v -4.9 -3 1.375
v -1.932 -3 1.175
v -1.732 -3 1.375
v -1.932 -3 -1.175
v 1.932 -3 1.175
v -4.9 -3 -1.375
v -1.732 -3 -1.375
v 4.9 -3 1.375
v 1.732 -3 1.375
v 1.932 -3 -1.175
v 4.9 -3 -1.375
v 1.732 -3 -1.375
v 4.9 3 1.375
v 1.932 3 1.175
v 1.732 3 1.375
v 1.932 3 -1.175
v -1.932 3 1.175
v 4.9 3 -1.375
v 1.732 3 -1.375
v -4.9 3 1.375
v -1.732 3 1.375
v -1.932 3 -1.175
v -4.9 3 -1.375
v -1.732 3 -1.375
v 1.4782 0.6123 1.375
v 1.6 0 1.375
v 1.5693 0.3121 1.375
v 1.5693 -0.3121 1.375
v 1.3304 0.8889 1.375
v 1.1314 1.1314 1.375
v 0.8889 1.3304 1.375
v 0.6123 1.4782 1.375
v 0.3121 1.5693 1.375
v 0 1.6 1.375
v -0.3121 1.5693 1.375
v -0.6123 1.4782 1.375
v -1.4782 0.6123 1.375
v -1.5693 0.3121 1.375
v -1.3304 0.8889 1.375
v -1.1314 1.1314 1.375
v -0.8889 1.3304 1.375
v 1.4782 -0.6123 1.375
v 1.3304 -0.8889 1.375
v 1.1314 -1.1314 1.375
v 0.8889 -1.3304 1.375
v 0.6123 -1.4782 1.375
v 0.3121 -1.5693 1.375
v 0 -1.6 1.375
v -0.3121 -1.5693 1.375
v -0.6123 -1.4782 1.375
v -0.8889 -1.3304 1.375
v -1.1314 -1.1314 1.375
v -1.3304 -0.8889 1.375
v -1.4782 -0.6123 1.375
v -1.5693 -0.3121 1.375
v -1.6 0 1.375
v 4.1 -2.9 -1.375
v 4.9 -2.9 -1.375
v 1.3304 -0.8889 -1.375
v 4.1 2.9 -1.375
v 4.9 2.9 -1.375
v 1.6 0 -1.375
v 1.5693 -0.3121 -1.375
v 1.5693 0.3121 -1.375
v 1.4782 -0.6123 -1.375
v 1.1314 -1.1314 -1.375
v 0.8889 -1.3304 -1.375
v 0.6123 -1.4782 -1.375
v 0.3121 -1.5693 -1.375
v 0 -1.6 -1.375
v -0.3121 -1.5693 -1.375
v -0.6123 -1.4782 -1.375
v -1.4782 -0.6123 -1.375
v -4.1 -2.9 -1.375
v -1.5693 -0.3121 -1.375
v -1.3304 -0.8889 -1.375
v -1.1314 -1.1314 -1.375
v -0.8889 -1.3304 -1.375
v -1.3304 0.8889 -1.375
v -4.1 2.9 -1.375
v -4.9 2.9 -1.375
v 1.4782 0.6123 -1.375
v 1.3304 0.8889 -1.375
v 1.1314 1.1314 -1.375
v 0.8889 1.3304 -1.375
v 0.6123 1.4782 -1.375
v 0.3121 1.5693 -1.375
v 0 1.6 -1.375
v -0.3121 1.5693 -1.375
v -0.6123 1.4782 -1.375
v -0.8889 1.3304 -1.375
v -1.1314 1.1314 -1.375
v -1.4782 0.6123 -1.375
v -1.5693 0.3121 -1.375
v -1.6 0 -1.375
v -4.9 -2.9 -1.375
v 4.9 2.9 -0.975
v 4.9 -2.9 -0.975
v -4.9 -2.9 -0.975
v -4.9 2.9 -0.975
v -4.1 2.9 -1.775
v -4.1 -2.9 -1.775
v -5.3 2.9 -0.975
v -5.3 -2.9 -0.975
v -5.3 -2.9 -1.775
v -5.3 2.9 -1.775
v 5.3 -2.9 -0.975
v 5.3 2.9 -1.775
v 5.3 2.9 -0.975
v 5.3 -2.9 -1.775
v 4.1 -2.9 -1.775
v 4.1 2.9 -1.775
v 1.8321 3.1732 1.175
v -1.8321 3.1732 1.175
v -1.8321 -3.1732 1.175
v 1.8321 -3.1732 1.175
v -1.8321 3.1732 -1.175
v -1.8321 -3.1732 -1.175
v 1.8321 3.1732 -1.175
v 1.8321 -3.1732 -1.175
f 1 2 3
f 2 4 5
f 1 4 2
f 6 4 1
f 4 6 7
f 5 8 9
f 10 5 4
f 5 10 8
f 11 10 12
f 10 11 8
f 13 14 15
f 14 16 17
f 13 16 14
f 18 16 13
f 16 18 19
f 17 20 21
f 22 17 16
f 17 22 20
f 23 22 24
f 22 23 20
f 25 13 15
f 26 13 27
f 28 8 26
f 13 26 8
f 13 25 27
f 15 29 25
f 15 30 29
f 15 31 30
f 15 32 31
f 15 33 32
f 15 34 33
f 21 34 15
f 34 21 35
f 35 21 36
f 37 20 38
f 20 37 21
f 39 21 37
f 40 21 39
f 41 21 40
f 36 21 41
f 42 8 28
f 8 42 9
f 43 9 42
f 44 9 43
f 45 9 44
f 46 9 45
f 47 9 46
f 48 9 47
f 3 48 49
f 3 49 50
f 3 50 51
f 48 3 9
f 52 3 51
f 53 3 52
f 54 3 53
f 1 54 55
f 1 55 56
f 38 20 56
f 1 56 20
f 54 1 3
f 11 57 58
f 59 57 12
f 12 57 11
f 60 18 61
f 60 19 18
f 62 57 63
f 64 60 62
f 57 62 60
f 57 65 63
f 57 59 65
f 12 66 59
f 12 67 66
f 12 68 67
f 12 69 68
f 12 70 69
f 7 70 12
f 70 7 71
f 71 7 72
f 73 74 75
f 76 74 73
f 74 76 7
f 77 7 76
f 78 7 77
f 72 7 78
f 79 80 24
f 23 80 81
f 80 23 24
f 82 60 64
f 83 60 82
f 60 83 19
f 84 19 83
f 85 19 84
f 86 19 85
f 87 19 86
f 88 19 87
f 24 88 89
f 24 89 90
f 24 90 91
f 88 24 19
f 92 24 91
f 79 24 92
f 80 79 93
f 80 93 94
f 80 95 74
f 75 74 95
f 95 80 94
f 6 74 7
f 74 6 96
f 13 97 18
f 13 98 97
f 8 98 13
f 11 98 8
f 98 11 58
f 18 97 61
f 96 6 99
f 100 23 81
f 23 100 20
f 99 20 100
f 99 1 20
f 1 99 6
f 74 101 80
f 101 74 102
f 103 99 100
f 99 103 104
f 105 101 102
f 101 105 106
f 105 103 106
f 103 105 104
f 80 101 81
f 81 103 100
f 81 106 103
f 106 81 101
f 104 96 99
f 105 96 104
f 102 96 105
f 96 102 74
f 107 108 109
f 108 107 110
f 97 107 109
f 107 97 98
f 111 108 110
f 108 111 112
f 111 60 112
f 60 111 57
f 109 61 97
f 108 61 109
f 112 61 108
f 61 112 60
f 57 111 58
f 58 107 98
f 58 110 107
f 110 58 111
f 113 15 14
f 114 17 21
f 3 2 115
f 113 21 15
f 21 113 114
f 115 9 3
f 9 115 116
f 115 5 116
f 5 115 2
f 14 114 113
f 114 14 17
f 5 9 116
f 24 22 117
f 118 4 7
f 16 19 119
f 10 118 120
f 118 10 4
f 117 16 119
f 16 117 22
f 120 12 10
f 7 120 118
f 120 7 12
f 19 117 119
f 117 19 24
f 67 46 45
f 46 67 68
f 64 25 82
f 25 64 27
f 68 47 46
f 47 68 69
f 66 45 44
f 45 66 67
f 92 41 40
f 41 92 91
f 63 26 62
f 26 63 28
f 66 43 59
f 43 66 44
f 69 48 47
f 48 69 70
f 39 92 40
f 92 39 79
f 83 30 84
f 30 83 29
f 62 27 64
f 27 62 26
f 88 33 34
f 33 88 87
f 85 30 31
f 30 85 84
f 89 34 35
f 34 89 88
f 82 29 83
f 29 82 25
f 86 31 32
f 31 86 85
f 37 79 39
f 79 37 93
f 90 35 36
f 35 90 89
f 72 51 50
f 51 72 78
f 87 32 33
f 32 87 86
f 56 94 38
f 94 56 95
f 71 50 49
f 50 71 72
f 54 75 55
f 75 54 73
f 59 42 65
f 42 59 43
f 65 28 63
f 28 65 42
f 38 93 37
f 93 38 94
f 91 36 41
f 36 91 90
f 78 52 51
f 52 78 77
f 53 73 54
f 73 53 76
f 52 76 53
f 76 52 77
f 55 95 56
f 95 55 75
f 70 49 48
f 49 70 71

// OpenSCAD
// Parameters
screw_diameter = 3; //[1.5:6:0.1]
across_flats = 6; //[3:12:0.1]
thickness = 2.75; //[1.4:5.5:0.05]
hole_style_is_clearance = 1; //[0:1:1]
clearance_diameter_if_clearance = 3.2; //[2.8:4.5:0.05]
tap_drill_diameter_if_tapped = 2.5; //[2:3:0.05]
corner_chamfer = 0.2; //[0:1:0.05]
t_slot_major_width = 10; //[6:20:0.1]
t_slot_minor_width = 6; //[4:12:0.1]
t_slot_lip_height = 0.8; //[0.3:2:0.05]
t_slot_lip_depth = 1.2; //[0.5:3:0.05]
t_slot_clearance = 0.1; //[0:0.5:0.05]
connection_overlap = 0.8; //[0.5:2:0.1]
nut_and_washer_enable = 0; //[0:1:1]
washer_outer_diameter = 7; //[5:14:0.1]
washer_thickness = 0.8; //[0.4:2:0.05]
viz_standoff = 0.6; //[0:2:0.05]

// Nut and Washer - complete geometry
module nut_and_washer() {
  if (nut_and_washer_enable) {
    union() {
      // Washer
      color("Silver") translate([0, 0, thickness/2 + viz_standoff + washer_thickness/2 - connection_overlap])
        cylinder(r=washer_outer_diameter/2, h=washer_thickness, center=true, $fn=32);
      
      // Nut
      color("DimGray") translate([0, 0, thickness/2 + viz_standoff + washer_thickness + thickness/2 - connection_overlap])
        difference() {
          cylinder(r=across_flats/(2*cos(30)), h=thickness, center=true, $fn=6);
          cylinder(r=screw_diameter/2, h=thickness + 2*connection_overlap, center=true, $fn=32);
        }
    }
  }
}

// T-slot nut body
module t_slot_nut_body() {
  union() {
    // Hex outer profile
    color("DimGray") translate([0, 0, 0])
      cylinder(r=across_flats/(2*cos(30)), h=thickness, center=true, $fn=6);
    
    // T-slot nut body block
    translate([0, 0, 0])
      cube([t_slot_major_width - 2*t_slot_clearance, across_flats, thickness], center=true);
    
    // Retention lips
    translate([-(t_slot_major_width - 2*t_slot_clearance)/2 + t_slot_lip_depth/2 - connection_overlap/2, 0, -thickness/2 + t_slot_lip_height/2 - connection_overlap/2])
      cube([t_slot_lip_depth, t_slot_minor_width - 2*t_slot_clearance, t_slot_lip_height], center=true);
    translate([(t_slot_major_width - 2*t_slot_clearance)/2 - t_slot_lip_depth/2 + connection_overlap/2, 0, -thickness/2 + t_slot_lip_height/2 - connection_overlap/2])
      cube([t_slot_lip_depth, t_slot_minor_width - 2*t_slot_clearance, t_slot_lip_height], center=true);
    
    // Lead-in chamfers
    translate([0, 0, thickness/2 - corner_chamfer/2])
      cylinder(r1=across_flats/(2*cos(30)) + corner_chamfer, r2=across_flats/(2*cos(30)), h=corner_chamfer, center=true, $fn=6);
    translate([0, 0, -thickness/2 + corner_chamfer/2])
      cylinder(r1=across_flats/(2*cos(30)), r2=across_flats/(2*cos(30)) + corner_chamfer, h=corner_chamfer, center=true, $fn=6);
  }
}

// Assembly
module assembly() {
  difference() {
    t_slot_nut_body();
    // Central screw hole
    translate([0, 0, 0])
      cylinder(r=((hole_style_is_clearance*clearance_diameter_if_clearance + (1-hole_style_is_clearance)*tap_drill_diameter_if_tapped)/2), h=thickness + 2*connection_overlap, center=true, $fn=32);
  }
  nut_and_washer();
}

assembly();
